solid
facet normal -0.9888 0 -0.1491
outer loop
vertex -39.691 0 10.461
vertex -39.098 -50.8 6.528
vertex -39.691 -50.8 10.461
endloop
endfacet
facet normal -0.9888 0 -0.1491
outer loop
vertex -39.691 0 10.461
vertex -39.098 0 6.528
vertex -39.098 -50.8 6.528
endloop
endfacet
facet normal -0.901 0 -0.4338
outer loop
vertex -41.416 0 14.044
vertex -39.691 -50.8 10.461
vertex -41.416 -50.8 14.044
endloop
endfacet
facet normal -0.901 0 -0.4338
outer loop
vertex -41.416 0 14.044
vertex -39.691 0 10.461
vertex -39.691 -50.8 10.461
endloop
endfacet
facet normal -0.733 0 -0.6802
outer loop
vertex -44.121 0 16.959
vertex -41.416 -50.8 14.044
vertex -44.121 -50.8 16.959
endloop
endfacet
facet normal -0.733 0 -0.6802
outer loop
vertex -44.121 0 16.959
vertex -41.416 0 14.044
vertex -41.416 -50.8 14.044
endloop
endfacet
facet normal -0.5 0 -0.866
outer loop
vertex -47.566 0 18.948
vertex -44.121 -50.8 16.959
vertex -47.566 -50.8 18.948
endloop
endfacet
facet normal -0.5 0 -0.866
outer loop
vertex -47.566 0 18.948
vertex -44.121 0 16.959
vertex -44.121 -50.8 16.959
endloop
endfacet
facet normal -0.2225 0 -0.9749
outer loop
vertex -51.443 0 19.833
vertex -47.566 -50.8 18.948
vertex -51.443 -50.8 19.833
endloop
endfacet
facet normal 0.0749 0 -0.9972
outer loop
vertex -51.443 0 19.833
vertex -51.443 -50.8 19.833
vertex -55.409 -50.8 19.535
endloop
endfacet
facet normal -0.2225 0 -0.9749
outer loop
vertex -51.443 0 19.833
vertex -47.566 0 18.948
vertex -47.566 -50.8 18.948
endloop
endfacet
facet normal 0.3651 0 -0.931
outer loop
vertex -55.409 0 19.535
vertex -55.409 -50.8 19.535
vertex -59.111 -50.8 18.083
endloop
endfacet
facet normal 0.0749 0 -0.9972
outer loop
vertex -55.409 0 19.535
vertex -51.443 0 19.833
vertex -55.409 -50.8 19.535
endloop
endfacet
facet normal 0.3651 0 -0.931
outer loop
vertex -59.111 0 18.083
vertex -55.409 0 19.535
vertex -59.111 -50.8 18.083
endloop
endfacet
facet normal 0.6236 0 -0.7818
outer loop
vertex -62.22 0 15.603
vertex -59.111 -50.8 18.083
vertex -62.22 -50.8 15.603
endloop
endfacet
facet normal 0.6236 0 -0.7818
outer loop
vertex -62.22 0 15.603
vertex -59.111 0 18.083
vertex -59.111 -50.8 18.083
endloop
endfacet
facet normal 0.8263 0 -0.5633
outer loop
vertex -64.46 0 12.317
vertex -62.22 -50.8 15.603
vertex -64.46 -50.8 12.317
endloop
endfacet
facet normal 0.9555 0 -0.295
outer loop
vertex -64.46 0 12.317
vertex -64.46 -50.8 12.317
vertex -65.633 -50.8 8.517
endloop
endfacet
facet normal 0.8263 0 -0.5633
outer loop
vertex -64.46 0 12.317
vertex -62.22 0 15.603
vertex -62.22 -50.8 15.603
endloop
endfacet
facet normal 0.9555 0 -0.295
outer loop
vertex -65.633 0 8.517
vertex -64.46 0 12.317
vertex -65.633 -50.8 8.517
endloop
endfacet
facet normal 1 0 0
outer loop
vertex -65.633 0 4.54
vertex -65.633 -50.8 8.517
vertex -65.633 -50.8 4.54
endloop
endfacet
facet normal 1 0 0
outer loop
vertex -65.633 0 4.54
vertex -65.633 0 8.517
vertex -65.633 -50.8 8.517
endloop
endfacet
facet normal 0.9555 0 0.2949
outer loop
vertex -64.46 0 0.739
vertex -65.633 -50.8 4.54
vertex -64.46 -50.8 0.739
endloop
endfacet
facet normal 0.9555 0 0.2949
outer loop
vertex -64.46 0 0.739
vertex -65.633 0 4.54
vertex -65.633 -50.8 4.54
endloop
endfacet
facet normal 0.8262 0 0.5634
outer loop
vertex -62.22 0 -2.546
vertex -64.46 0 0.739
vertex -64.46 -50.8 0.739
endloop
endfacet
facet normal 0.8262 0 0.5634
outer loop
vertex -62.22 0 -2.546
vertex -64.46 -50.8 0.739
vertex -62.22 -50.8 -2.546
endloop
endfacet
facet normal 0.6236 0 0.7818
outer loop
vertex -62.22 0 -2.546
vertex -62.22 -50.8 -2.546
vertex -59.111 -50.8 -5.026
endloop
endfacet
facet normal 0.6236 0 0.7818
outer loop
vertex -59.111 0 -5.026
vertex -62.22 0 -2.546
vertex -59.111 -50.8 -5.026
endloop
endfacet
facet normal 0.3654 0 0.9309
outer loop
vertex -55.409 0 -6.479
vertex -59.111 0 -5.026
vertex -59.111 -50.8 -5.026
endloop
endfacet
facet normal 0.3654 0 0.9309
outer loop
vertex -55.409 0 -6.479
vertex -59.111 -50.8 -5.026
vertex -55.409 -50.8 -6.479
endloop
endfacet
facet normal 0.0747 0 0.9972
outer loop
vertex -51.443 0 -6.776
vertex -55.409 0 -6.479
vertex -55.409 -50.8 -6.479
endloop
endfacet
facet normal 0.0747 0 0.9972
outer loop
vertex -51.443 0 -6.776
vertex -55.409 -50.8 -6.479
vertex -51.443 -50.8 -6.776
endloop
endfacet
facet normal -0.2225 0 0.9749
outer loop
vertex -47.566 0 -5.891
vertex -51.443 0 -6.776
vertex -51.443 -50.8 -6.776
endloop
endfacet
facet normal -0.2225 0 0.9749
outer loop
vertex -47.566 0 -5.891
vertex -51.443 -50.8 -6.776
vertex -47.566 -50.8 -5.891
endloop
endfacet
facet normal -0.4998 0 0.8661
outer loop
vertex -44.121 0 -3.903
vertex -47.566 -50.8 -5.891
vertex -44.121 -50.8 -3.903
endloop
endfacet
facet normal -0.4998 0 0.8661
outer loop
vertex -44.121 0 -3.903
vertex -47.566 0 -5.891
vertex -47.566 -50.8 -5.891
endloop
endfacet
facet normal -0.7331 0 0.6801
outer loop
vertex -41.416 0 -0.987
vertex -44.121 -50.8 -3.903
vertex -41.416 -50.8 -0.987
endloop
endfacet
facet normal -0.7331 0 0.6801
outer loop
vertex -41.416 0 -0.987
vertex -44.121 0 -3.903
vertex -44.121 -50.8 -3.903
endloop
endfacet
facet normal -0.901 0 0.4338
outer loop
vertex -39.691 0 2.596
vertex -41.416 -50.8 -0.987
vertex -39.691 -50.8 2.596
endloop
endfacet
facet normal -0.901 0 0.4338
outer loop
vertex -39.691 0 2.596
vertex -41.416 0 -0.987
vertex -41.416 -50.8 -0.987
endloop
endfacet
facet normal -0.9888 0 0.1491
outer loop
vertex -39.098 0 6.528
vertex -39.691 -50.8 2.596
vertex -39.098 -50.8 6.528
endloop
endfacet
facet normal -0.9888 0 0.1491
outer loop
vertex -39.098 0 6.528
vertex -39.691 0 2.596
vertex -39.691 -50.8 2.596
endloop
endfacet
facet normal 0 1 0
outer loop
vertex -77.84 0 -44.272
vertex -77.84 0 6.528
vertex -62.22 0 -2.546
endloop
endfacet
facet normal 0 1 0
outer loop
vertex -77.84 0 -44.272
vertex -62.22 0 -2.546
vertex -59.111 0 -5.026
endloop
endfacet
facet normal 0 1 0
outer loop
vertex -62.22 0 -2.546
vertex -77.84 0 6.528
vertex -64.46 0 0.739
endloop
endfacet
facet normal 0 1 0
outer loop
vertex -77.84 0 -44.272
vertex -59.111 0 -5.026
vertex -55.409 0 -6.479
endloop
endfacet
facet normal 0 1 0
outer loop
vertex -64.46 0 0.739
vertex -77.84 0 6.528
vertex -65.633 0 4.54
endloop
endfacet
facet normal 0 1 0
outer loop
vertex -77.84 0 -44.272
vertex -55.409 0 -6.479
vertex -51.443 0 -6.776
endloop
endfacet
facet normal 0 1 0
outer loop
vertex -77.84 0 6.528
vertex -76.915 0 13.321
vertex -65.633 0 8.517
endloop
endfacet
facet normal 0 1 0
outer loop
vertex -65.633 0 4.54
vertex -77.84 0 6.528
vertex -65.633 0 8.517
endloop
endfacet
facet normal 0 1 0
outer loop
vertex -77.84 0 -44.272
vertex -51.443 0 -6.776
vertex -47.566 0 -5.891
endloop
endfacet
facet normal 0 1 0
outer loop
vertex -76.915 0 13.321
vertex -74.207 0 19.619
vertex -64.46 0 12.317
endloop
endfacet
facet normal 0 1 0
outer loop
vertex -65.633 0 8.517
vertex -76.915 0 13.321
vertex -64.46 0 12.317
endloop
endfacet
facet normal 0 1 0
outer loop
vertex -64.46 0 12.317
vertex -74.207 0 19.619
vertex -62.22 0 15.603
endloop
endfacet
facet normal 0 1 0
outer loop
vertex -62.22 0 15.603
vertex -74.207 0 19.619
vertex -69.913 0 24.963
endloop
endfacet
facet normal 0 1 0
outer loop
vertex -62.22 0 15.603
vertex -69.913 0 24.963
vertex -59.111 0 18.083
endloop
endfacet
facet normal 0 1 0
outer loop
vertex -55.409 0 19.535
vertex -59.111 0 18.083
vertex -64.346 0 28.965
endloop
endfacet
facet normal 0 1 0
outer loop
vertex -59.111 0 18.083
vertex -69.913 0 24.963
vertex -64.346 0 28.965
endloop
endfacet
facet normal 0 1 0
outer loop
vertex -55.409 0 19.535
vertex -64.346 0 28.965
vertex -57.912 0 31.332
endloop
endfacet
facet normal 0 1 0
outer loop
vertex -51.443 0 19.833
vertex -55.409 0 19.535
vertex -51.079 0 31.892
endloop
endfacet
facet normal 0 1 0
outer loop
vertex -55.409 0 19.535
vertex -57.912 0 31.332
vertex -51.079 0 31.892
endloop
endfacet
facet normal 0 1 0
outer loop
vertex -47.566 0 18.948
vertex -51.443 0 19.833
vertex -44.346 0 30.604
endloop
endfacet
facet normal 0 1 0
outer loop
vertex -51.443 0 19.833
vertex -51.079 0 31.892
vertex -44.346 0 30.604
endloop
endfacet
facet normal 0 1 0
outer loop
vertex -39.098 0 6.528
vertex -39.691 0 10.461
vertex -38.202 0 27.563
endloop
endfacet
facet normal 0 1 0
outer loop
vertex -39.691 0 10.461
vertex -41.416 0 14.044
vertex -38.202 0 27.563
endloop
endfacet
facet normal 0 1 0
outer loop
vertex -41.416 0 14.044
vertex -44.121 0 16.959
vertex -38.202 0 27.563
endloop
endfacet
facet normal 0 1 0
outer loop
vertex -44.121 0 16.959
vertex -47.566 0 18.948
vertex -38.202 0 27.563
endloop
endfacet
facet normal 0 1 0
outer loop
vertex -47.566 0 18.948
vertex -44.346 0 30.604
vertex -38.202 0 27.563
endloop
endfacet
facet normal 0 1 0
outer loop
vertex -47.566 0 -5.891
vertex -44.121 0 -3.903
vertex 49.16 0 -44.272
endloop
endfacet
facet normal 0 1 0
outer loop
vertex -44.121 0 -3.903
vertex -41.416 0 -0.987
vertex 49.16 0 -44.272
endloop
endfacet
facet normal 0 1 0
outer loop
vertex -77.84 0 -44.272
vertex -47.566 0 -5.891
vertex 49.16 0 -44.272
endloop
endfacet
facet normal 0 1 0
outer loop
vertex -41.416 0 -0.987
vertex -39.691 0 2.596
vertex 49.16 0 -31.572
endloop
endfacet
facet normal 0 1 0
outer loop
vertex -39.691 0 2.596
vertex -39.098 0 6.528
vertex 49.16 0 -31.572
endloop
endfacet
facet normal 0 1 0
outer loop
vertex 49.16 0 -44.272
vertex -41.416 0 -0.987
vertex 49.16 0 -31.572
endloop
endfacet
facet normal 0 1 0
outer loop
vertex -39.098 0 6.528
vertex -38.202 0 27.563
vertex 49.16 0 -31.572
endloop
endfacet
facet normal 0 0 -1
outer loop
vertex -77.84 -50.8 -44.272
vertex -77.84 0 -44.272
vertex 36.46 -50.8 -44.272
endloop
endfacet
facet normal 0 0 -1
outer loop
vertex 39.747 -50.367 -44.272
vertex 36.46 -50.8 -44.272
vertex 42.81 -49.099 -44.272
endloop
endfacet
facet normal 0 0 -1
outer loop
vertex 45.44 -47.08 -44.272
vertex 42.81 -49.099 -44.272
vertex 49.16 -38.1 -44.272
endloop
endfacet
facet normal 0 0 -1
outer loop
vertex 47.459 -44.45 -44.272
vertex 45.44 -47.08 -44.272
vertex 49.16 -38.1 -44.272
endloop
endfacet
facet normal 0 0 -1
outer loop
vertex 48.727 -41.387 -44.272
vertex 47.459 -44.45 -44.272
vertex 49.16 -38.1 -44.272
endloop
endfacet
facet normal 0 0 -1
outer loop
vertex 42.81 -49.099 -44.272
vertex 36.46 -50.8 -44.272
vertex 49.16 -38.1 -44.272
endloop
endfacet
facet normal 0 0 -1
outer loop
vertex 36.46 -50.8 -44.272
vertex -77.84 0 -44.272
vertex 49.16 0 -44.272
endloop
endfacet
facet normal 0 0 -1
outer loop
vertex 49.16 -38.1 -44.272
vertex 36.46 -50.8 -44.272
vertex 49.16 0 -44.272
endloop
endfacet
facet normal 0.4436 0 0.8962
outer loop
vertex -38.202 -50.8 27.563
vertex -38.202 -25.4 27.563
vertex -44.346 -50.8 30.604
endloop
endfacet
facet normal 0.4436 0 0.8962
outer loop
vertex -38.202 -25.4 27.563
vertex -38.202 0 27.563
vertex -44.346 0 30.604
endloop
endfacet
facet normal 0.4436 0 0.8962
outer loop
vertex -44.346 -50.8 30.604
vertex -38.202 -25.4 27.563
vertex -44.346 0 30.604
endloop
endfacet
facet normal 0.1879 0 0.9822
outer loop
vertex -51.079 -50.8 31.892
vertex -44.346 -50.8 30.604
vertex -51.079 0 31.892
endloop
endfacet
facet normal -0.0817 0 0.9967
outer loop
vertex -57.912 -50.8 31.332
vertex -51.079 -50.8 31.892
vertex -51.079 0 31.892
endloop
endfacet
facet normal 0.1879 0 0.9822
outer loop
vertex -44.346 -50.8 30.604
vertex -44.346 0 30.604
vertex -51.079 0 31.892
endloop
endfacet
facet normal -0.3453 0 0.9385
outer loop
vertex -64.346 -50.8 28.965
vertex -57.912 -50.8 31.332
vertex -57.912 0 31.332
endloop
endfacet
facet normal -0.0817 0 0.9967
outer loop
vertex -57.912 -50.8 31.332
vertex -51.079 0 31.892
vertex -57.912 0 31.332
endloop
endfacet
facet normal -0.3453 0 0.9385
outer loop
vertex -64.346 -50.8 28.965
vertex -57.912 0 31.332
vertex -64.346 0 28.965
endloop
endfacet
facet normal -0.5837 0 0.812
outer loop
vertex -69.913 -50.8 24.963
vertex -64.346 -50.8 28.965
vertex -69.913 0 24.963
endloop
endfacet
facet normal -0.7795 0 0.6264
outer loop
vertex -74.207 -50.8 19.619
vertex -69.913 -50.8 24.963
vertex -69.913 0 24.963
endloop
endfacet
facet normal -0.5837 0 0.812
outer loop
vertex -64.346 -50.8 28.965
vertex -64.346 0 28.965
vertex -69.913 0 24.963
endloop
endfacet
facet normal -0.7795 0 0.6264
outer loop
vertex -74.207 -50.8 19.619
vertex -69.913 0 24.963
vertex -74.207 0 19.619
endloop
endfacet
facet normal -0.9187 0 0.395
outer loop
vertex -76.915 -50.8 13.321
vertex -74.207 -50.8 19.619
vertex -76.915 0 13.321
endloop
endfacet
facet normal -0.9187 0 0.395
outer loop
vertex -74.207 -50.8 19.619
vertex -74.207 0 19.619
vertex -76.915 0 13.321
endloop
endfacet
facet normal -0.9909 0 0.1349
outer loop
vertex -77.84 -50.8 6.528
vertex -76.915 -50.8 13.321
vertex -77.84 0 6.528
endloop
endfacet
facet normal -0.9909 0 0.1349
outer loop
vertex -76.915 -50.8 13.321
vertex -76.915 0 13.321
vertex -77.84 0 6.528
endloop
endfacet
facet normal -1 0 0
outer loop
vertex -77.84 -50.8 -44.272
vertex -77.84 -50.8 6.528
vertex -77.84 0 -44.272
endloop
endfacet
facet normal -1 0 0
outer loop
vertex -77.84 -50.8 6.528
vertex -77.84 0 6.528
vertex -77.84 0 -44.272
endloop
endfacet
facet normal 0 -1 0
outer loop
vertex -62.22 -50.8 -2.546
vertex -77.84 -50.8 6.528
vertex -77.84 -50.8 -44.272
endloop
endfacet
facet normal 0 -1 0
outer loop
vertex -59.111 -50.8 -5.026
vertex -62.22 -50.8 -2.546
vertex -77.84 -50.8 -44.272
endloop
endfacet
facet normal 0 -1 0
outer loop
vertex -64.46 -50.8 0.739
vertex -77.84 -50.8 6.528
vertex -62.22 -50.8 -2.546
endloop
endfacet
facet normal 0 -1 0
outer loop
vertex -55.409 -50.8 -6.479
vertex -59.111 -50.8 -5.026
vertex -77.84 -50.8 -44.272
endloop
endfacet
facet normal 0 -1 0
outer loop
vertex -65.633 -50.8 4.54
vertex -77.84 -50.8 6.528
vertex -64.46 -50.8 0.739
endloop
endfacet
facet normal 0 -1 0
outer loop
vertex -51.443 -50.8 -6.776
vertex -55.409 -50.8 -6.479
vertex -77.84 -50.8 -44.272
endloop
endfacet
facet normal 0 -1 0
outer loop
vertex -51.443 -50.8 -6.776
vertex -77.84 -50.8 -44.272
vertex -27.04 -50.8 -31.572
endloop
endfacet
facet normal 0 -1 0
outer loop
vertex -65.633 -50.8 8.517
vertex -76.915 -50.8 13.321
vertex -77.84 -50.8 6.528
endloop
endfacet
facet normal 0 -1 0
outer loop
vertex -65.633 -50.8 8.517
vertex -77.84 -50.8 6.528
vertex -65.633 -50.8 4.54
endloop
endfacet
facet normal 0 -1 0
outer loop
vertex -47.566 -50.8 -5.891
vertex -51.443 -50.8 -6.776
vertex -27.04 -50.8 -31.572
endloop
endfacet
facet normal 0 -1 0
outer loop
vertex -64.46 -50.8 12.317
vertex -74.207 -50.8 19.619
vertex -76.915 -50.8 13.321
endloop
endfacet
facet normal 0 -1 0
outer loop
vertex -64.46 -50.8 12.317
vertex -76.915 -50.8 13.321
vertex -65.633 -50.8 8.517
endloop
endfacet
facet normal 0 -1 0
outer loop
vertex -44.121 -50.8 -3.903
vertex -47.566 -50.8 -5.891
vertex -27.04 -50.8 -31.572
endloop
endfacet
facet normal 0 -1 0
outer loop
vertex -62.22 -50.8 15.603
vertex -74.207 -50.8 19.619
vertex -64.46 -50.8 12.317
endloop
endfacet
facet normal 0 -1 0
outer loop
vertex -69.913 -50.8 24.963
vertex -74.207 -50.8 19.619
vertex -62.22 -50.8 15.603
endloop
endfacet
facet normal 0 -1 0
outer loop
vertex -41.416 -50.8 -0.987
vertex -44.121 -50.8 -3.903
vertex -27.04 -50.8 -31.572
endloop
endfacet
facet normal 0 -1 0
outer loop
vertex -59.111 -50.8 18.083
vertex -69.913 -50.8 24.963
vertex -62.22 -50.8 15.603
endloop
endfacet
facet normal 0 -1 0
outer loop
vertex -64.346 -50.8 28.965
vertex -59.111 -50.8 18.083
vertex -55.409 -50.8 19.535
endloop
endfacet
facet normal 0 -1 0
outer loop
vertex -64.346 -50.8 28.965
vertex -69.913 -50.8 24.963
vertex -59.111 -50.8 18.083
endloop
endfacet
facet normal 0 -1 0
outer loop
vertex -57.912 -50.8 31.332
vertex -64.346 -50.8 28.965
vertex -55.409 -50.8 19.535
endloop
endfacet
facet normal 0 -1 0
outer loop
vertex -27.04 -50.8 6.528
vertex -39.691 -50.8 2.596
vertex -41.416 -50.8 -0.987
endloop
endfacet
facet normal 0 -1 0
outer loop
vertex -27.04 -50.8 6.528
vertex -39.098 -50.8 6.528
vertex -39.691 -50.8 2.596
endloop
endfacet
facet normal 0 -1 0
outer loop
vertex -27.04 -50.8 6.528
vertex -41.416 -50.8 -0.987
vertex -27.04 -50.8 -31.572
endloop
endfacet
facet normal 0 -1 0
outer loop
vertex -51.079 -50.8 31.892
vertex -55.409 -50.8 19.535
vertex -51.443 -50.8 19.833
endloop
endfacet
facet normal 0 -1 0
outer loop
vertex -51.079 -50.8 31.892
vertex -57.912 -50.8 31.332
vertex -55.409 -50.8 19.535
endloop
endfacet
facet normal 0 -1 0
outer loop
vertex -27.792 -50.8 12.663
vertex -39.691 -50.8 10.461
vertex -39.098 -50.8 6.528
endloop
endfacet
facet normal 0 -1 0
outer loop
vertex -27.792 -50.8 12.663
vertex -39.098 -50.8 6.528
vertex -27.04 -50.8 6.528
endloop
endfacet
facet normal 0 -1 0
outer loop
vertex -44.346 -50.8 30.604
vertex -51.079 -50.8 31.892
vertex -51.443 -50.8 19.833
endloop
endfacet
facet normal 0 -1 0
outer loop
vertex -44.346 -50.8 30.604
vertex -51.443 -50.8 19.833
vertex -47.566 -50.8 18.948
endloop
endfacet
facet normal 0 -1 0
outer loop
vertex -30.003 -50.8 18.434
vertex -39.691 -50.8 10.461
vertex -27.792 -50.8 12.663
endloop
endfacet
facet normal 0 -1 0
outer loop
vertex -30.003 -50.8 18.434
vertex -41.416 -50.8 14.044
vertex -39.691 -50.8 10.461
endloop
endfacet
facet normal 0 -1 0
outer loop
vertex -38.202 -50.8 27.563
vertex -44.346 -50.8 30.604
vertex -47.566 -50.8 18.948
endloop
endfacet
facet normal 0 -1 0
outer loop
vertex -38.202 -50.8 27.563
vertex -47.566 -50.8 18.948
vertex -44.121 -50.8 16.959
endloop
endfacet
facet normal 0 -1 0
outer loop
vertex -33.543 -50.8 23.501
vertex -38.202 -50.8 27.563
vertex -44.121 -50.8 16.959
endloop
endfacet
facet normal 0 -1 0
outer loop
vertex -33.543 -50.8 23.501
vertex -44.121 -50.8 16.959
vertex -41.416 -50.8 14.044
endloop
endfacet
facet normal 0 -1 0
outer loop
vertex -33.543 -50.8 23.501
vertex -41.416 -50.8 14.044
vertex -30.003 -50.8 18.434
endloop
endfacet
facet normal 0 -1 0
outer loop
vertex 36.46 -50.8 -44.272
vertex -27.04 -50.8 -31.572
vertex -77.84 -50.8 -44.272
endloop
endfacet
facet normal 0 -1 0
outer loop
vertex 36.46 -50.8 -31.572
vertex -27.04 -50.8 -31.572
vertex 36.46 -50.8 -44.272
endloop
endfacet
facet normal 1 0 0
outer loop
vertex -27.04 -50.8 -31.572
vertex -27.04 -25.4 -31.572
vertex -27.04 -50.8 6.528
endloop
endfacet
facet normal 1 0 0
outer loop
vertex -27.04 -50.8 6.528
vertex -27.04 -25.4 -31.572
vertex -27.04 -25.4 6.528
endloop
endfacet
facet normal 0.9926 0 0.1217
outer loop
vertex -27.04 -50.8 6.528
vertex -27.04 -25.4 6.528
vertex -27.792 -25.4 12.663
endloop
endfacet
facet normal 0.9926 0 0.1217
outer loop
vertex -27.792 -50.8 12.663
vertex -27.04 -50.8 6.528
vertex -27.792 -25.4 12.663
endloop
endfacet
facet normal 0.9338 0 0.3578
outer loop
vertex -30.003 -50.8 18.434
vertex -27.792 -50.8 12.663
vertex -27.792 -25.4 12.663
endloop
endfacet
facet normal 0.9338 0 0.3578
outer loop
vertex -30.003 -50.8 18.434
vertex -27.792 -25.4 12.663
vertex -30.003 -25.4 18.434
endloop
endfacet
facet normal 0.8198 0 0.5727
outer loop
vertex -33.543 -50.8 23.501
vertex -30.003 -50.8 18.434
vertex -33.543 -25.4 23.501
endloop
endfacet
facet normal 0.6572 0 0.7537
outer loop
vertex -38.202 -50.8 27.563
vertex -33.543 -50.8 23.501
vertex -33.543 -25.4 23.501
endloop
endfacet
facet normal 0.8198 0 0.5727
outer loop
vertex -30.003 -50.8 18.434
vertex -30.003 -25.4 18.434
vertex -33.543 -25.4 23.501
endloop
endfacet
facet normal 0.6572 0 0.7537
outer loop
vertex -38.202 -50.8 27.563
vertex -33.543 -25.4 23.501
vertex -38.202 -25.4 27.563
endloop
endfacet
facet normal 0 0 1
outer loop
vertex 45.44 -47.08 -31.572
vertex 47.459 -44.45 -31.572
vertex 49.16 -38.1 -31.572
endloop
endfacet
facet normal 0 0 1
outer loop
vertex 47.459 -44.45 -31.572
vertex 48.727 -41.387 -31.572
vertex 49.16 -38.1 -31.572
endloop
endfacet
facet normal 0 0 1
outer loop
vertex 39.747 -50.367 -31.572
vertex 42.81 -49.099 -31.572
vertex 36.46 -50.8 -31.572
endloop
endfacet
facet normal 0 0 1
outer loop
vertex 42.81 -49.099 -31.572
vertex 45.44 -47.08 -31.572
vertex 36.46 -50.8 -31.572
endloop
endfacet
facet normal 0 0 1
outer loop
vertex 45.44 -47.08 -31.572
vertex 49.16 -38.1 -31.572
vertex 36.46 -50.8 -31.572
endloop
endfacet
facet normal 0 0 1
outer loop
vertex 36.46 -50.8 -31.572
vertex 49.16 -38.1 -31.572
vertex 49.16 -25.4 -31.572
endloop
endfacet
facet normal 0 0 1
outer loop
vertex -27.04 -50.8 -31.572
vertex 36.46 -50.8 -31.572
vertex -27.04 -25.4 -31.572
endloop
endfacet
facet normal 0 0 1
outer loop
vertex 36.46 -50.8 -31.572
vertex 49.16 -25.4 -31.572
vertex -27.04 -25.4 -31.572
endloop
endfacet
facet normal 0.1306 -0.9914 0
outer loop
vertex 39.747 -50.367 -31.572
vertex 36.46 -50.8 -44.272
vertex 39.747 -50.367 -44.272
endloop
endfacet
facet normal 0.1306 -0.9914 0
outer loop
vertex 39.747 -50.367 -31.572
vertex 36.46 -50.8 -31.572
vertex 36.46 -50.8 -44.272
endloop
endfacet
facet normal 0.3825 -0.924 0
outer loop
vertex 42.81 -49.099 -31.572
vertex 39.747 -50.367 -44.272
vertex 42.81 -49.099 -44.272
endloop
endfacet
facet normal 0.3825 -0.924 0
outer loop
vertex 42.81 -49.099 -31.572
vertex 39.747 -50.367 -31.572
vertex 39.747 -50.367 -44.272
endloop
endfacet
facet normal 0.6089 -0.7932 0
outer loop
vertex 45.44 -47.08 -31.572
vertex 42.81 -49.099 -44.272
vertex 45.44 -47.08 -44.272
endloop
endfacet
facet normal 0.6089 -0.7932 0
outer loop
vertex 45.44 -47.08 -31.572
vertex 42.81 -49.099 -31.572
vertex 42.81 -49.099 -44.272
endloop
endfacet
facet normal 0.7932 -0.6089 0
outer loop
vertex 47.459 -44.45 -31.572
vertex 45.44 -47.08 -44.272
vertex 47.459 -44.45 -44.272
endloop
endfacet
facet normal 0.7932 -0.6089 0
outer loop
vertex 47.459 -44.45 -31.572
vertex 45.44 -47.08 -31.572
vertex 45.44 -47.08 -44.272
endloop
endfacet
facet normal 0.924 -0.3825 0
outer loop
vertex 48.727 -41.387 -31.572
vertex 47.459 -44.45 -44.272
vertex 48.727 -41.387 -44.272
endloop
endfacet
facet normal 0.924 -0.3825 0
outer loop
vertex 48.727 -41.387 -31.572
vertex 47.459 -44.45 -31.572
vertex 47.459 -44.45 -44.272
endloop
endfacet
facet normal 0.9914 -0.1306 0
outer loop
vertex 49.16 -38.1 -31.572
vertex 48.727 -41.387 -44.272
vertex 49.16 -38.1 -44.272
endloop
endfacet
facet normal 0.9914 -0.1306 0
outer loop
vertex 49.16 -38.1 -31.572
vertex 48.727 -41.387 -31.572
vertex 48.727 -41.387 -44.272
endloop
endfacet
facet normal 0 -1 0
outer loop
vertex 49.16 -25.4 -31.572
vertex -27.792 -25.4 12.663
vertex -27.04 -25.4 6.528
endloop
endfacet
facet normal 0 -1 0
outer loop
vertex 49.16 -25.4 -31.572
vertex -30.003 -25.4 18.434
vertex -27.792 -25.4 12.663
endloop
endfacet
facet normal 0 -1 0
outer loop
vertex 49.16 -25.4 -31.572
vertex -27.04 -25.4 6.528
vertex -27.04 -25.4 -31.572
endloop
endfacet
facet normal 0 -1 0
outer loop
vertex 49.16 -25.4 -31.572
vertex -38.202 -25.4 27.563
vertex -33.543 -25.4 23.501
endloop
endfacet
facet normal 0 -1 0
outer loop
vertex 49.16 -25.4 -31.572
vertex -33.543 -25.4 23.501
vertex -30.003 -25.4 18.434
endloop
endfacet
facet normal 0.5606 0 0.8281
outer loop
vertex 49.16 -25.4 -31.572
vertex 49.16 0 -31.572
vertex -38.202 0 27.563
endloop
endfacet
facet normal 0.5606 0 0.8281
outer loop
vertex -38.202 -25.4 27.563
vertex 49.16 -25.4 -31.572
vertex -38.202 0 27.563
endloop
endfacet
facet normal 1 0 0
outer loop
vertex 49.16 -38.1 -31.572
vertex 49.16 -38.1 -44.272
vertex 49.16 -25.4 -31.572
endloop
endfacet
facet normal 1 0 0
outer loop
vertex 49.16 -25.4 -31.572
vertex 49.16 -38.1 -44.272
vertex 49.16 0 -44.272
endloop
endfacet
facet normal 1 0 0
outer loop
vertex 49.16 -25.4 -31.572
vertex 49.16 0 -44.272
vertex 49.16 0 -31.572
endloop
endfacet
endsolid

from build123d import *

# Parameters (mm, degrees)
F0_R     = 13.341741
F1_DEPTH = 25.4
F2_R     = 13.341741
F3_DEPTH = 25.4
F4_R     = 12.7


with BuildPart() as f1:
    # F0 (on Front) → F1 (new body)
    with BuildSketch(Plane.XZ):
        with BuildLine():
            Line((49.160112, -31.571778), (-38.202015, 27.56255))
            ThreePointArc((-38.202015, 27.56255), (-64.346148, 28.964821), (-77.839888, 6.528222))
            Line((-77.839888, 6.528222), (-77.839888, -44.271778))
            Line((-77.839888, -44.271778), (49.160112, -44.271778))
            Line((49.160112, -44.271778), (49.160112, -31.571778))
        make_face()
        with Locations((-52.439888, 6.528222)):
            Circle(F0_R, mode=Mode.SUBTRACT)
    extrude(amount=F1_DEPTH)

    # F2 (on face) → F3 (join)
    with BuildSketch(Plane.XZ.offset(25.4)):
        with BuildLine():
            Line((-27.039888, -31.571778), (-27.039888, 6.528222))
            ThreePointArc((-27.039888, 6.528222), (-30.003289, 18.434481), (-38.202015, 27.56255))
            ThreePointArc((-38.202015, 27.56255), (-64.346148, 28.964821), (-77.839888, 6.528222))
            Line((-77.839888, 6.528222), (-77.839888, -31.571778))
            Line((-77.839888, -31.571778), (-77.839888, -44.271778))
            Line((-77.839888, -44.271778), (49.160112, -44.271778))
            Line((49.160112, -44.271778), (49.160112, -31.571778))
            Line((49.160112, -31.571778), (-27.039888, -31.571778))
        make_face()
        with Locations((-52.439888, 6.528222)):
            Circle(F2_R, mode=Mode.SUBTRACT)
    extrude(amount=F3_DEPTH)

    # F4
    f4_edges = [f1.edges().sort_by_distance(p)[0] for p in [
        (49.160112, -50.8, -37.921778),
    ]]
    fillet(f4_edges, radius=F4_R)


solid = f1.part
